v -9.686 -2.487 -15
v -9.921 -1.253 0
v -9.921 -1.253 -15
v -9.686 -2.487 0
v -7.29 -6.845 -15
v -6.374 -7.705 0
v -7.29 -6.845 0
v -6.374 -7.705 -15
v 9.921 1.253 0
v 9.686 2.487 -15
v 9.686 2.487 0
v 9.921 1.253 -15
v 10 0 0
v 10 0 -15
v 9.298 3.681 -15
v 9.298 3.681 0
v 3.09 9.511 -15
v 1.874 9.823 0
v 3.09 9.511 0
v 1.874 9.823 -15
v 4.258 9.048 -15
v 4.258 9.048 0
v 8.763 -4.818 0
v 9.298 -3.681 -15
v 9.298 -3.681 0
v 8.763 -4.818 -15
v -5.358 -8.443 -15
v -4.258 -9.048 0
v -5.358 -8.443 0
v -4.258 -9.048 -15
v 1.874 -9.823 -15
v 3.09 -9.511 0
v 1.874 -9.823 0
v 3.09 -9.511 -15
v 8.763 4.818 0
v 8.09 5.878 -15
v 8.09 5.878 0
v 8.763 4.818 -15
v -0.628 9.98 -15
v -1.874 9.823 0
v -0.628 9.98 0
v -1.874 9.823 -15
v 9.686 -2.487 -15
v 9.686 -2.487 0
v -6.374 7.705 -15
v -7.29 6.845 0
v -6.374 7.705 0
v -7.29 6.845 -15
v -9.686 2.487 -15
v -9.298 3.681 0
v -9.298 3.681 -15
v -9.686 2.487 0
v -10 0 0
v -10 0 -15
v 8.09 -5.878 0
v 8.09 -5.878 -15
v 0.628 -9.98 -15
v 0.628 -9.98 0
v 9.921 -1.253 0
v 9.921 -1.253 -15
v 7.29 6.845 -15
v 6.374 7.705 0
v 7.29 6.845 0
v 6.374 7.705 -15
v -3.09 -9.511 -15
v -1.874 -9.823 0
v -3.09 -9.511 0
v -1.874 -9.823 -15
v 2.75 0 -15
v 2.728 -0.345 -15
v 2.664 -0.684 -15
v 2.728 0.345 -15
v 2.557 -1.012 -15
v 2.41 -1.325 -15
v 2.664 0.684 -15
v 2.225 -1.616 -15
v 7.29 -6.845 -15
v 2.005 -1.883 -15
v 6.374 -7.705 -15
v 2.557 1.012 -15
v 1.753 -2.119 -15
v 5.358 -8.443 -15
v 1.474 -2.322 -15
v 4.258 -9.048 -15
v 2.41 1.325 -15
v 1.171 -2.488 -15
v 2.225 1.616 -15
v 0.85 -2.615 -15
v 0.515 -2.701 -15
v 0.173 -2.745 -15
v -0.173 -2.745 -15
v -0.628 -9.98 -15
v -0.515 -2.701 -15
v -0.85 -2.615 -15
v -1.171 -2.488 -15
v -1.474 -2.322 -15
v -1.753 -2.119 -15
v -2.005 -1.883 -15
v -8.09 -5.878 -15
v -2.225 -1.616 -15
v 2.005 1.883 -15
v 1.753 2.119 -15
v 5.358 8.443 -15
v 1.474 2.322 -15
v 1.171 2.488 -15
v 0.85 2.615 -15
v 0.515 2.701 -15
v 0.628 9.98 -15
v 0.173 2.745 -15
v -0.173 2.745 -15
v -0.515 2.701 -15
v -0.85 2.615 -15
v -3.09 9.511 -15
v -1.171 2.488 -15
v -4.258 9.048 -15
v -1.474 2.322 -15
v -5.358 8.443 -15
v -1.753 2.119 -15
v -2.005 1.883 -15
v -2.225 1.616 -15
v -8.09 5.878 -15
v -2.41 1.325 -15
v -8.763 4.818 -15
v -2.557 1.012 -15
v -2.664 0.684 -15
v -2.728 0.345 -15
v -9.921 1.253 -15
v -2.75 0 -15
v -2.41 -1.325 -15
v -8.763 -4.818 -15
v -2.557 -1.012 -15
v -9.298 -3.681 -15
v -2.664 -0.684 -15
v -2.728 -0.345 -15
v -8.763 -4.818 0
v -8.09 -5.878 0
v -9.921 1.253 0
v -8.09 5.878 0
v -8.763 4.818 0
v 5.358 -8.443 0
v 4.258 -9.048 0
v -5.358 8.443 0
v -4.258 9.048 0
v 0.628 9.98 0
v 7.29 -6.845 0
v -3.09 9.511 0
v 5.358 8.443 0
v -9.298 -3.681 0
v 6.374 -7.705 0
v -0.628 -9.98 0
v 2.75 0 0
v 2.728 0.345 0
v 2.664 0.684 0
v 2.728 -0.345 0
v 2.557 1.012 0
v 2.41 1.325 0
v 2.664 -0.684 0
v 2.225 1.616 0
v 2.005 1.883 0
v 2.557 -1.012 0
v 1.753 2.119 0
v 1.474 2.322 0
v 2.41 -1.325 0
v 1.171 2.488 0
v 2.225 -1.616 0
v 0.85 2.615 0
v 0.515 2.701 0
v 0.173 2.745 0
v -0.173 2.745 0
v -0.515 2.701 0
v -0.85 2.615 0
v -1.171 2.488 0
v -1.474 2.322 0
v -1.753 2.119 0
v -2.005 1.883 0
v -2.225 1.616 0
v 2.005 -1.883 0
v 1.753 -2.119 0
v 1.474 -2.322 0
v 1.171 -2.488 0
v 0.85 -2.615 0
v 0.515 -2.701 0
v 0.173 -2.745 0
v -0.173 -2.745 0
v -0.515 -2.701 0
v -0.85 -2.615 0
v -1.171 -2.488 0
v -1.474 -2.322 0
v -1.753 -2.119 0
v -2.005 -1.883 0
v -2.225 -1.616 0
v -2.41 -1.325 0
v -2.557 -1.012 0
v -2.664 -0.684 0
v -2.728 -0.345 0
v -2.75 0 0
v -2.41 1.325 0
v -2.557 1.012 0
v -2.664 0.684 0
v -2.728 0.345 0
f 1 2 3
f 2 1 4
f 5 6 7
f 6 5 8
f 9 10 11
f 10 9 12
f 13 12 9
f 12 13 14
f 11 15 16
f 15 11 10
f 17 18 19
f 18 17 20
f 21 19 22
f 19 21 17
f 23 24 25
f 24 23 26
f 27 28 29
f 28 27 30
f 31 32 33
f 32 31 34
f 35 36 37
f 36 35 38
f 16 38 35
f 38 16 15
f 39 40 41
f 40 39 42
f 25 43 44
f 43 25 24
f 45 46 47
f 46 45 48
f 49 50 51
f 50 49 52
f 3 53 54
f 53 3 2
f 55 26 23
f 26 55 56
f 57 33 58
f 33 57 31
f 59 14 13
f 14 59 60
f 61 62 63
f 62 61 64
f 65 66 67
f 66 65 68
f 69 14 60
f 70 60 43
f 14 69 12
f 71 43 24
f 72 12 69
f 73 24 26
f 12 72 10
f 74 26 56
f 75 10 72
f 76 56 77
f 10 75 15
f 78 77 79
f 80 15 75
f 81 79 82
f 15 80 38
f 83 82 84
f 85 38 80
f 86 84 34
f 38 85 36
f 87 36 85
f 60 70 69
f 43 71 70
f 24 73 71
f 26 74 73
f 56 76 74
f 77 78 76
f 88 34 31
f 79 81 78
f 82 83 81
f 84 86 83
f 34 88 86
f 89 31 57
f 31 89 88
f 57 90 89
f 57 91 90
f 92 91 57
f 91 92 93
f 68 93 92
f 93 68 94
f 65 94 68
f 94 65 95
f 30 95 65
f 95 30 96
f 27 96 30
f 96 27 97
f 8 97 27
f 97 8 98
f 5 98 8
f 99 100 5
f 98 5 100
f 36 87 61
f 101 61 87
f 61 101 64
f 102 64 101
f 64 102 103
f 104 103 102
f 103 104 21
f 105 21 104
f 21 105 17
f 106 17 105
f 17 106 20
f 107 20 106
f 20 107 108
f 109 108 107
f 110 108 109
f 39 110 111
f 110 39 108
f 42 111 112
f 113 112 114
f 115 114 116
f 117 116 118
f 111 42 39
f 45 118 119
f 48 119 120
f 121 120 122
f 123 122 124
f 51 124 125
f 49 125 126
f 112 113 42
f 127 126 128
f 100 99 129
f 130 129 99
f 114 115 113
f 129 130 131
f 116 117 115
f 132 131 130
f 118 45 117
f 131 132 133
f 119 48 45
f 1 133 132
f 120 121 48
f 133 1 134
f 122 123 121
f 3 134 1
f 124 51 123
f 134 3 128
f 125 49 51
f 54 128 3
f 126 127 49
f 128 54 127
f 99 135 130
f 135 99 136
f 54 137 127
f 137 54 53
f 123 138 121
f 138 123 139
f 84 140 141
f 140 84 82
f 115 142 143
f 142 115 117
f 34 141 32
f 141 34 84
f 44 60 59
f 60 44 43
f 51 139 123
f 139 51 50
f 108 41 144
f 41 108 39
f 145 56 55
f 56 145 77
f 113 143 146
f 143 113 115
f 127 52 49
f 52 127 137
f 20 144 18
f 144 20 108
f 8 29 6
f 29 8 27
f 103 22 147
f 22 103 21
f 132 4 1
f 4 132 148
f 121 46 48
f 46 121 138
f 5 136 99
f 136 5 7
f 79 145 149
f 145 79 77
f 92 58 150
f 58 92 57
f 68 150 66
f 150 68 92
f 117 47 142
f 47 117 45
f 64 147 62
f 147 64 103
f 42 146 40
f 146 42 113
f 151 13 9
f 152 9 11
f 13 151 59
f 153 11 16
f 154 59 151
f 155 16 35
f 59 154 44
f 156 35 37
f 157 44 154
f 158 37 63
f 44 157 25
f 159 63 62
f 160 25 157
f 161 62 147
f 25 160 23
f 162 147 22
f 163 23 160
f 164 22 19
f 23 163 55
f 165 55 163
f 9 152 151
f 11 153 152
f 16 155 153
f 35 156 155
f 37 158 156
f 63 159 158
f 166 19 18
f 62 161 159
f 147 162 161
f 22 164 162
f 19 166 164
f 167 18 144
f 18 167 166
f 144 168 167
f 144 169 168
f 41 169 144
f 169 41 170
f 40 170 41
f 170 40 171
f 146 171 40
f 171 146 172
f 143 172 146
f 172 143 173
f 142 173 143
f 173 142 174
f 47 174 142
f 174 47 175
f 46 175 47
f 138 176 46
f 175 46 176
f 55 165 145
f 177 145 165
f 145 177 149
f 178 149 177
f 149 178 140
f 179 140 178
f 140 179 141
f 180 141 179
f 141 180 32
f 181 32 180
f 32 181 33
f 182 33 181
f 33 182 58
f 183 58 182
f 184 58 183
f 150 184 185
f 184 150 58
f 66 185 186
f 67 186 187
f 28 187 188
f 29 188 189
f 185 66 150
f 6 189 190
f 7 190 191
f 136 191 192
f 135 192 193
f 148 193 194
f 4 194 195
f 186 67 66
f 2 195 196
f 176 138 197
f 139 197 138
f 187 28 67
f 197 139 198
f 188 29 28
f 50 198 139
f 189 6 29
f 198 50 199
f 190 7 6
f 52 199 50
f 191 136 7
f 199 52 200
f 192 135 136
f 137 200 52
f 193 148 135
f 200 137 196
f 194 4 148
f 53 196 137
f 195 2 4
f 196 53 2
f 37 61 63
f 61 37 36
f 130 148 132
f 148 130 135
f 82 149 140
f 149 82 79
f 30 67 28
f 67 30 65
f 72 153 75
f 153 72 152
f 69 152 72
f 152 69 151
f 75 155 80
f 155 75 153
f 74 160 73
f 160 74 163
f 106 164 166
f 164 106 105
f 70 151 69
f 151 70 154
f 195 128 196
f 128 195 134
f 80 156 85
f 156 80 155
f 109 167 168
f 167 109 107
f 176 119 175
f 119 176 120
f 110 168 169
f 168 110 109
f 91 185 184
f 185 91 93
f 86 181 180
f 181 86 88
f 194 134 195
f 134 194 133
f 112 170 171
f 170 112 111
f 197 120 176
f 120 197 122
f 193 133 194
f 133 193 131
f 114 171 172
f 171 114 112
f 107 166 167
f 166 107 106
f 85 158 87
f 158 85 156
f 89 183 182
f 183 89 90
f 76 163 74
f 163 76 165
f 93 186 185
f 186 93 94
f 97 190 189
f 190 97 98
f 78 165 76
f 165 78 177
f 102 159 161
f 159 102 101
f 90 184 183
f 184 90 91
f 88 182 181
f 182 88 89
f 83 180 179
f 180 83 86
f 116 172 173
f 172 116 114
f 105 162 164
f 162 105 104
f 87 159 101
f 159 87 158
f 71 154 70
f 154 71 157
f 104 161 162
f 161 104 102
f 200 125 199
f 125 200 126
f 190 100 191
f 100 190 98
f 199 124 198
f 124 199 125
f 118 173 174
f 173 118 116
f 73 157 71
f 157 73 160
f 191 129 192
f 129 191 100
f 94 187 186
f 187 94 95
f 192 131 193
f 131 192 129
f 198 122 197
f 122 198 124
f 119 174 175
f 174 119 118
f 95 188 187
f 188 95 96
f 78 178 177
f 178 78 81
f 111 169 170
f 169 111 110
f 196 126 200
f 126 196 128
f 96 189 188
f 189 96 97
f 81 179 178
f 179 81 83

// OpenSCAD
$fn = 50;


difference() {
	union() {
		translate(v = [0, 0, -15.0000000000]) {
			cylinder(h = 15, r = 10.0000000000);
		}
		cylinder(h = 0, r = 19.0000000000);
	}
	union() {
		#translate(v = [0, 0, -15]) {
			cylinder(h = 15, r = 2.7500000000);
		}
	}
}
